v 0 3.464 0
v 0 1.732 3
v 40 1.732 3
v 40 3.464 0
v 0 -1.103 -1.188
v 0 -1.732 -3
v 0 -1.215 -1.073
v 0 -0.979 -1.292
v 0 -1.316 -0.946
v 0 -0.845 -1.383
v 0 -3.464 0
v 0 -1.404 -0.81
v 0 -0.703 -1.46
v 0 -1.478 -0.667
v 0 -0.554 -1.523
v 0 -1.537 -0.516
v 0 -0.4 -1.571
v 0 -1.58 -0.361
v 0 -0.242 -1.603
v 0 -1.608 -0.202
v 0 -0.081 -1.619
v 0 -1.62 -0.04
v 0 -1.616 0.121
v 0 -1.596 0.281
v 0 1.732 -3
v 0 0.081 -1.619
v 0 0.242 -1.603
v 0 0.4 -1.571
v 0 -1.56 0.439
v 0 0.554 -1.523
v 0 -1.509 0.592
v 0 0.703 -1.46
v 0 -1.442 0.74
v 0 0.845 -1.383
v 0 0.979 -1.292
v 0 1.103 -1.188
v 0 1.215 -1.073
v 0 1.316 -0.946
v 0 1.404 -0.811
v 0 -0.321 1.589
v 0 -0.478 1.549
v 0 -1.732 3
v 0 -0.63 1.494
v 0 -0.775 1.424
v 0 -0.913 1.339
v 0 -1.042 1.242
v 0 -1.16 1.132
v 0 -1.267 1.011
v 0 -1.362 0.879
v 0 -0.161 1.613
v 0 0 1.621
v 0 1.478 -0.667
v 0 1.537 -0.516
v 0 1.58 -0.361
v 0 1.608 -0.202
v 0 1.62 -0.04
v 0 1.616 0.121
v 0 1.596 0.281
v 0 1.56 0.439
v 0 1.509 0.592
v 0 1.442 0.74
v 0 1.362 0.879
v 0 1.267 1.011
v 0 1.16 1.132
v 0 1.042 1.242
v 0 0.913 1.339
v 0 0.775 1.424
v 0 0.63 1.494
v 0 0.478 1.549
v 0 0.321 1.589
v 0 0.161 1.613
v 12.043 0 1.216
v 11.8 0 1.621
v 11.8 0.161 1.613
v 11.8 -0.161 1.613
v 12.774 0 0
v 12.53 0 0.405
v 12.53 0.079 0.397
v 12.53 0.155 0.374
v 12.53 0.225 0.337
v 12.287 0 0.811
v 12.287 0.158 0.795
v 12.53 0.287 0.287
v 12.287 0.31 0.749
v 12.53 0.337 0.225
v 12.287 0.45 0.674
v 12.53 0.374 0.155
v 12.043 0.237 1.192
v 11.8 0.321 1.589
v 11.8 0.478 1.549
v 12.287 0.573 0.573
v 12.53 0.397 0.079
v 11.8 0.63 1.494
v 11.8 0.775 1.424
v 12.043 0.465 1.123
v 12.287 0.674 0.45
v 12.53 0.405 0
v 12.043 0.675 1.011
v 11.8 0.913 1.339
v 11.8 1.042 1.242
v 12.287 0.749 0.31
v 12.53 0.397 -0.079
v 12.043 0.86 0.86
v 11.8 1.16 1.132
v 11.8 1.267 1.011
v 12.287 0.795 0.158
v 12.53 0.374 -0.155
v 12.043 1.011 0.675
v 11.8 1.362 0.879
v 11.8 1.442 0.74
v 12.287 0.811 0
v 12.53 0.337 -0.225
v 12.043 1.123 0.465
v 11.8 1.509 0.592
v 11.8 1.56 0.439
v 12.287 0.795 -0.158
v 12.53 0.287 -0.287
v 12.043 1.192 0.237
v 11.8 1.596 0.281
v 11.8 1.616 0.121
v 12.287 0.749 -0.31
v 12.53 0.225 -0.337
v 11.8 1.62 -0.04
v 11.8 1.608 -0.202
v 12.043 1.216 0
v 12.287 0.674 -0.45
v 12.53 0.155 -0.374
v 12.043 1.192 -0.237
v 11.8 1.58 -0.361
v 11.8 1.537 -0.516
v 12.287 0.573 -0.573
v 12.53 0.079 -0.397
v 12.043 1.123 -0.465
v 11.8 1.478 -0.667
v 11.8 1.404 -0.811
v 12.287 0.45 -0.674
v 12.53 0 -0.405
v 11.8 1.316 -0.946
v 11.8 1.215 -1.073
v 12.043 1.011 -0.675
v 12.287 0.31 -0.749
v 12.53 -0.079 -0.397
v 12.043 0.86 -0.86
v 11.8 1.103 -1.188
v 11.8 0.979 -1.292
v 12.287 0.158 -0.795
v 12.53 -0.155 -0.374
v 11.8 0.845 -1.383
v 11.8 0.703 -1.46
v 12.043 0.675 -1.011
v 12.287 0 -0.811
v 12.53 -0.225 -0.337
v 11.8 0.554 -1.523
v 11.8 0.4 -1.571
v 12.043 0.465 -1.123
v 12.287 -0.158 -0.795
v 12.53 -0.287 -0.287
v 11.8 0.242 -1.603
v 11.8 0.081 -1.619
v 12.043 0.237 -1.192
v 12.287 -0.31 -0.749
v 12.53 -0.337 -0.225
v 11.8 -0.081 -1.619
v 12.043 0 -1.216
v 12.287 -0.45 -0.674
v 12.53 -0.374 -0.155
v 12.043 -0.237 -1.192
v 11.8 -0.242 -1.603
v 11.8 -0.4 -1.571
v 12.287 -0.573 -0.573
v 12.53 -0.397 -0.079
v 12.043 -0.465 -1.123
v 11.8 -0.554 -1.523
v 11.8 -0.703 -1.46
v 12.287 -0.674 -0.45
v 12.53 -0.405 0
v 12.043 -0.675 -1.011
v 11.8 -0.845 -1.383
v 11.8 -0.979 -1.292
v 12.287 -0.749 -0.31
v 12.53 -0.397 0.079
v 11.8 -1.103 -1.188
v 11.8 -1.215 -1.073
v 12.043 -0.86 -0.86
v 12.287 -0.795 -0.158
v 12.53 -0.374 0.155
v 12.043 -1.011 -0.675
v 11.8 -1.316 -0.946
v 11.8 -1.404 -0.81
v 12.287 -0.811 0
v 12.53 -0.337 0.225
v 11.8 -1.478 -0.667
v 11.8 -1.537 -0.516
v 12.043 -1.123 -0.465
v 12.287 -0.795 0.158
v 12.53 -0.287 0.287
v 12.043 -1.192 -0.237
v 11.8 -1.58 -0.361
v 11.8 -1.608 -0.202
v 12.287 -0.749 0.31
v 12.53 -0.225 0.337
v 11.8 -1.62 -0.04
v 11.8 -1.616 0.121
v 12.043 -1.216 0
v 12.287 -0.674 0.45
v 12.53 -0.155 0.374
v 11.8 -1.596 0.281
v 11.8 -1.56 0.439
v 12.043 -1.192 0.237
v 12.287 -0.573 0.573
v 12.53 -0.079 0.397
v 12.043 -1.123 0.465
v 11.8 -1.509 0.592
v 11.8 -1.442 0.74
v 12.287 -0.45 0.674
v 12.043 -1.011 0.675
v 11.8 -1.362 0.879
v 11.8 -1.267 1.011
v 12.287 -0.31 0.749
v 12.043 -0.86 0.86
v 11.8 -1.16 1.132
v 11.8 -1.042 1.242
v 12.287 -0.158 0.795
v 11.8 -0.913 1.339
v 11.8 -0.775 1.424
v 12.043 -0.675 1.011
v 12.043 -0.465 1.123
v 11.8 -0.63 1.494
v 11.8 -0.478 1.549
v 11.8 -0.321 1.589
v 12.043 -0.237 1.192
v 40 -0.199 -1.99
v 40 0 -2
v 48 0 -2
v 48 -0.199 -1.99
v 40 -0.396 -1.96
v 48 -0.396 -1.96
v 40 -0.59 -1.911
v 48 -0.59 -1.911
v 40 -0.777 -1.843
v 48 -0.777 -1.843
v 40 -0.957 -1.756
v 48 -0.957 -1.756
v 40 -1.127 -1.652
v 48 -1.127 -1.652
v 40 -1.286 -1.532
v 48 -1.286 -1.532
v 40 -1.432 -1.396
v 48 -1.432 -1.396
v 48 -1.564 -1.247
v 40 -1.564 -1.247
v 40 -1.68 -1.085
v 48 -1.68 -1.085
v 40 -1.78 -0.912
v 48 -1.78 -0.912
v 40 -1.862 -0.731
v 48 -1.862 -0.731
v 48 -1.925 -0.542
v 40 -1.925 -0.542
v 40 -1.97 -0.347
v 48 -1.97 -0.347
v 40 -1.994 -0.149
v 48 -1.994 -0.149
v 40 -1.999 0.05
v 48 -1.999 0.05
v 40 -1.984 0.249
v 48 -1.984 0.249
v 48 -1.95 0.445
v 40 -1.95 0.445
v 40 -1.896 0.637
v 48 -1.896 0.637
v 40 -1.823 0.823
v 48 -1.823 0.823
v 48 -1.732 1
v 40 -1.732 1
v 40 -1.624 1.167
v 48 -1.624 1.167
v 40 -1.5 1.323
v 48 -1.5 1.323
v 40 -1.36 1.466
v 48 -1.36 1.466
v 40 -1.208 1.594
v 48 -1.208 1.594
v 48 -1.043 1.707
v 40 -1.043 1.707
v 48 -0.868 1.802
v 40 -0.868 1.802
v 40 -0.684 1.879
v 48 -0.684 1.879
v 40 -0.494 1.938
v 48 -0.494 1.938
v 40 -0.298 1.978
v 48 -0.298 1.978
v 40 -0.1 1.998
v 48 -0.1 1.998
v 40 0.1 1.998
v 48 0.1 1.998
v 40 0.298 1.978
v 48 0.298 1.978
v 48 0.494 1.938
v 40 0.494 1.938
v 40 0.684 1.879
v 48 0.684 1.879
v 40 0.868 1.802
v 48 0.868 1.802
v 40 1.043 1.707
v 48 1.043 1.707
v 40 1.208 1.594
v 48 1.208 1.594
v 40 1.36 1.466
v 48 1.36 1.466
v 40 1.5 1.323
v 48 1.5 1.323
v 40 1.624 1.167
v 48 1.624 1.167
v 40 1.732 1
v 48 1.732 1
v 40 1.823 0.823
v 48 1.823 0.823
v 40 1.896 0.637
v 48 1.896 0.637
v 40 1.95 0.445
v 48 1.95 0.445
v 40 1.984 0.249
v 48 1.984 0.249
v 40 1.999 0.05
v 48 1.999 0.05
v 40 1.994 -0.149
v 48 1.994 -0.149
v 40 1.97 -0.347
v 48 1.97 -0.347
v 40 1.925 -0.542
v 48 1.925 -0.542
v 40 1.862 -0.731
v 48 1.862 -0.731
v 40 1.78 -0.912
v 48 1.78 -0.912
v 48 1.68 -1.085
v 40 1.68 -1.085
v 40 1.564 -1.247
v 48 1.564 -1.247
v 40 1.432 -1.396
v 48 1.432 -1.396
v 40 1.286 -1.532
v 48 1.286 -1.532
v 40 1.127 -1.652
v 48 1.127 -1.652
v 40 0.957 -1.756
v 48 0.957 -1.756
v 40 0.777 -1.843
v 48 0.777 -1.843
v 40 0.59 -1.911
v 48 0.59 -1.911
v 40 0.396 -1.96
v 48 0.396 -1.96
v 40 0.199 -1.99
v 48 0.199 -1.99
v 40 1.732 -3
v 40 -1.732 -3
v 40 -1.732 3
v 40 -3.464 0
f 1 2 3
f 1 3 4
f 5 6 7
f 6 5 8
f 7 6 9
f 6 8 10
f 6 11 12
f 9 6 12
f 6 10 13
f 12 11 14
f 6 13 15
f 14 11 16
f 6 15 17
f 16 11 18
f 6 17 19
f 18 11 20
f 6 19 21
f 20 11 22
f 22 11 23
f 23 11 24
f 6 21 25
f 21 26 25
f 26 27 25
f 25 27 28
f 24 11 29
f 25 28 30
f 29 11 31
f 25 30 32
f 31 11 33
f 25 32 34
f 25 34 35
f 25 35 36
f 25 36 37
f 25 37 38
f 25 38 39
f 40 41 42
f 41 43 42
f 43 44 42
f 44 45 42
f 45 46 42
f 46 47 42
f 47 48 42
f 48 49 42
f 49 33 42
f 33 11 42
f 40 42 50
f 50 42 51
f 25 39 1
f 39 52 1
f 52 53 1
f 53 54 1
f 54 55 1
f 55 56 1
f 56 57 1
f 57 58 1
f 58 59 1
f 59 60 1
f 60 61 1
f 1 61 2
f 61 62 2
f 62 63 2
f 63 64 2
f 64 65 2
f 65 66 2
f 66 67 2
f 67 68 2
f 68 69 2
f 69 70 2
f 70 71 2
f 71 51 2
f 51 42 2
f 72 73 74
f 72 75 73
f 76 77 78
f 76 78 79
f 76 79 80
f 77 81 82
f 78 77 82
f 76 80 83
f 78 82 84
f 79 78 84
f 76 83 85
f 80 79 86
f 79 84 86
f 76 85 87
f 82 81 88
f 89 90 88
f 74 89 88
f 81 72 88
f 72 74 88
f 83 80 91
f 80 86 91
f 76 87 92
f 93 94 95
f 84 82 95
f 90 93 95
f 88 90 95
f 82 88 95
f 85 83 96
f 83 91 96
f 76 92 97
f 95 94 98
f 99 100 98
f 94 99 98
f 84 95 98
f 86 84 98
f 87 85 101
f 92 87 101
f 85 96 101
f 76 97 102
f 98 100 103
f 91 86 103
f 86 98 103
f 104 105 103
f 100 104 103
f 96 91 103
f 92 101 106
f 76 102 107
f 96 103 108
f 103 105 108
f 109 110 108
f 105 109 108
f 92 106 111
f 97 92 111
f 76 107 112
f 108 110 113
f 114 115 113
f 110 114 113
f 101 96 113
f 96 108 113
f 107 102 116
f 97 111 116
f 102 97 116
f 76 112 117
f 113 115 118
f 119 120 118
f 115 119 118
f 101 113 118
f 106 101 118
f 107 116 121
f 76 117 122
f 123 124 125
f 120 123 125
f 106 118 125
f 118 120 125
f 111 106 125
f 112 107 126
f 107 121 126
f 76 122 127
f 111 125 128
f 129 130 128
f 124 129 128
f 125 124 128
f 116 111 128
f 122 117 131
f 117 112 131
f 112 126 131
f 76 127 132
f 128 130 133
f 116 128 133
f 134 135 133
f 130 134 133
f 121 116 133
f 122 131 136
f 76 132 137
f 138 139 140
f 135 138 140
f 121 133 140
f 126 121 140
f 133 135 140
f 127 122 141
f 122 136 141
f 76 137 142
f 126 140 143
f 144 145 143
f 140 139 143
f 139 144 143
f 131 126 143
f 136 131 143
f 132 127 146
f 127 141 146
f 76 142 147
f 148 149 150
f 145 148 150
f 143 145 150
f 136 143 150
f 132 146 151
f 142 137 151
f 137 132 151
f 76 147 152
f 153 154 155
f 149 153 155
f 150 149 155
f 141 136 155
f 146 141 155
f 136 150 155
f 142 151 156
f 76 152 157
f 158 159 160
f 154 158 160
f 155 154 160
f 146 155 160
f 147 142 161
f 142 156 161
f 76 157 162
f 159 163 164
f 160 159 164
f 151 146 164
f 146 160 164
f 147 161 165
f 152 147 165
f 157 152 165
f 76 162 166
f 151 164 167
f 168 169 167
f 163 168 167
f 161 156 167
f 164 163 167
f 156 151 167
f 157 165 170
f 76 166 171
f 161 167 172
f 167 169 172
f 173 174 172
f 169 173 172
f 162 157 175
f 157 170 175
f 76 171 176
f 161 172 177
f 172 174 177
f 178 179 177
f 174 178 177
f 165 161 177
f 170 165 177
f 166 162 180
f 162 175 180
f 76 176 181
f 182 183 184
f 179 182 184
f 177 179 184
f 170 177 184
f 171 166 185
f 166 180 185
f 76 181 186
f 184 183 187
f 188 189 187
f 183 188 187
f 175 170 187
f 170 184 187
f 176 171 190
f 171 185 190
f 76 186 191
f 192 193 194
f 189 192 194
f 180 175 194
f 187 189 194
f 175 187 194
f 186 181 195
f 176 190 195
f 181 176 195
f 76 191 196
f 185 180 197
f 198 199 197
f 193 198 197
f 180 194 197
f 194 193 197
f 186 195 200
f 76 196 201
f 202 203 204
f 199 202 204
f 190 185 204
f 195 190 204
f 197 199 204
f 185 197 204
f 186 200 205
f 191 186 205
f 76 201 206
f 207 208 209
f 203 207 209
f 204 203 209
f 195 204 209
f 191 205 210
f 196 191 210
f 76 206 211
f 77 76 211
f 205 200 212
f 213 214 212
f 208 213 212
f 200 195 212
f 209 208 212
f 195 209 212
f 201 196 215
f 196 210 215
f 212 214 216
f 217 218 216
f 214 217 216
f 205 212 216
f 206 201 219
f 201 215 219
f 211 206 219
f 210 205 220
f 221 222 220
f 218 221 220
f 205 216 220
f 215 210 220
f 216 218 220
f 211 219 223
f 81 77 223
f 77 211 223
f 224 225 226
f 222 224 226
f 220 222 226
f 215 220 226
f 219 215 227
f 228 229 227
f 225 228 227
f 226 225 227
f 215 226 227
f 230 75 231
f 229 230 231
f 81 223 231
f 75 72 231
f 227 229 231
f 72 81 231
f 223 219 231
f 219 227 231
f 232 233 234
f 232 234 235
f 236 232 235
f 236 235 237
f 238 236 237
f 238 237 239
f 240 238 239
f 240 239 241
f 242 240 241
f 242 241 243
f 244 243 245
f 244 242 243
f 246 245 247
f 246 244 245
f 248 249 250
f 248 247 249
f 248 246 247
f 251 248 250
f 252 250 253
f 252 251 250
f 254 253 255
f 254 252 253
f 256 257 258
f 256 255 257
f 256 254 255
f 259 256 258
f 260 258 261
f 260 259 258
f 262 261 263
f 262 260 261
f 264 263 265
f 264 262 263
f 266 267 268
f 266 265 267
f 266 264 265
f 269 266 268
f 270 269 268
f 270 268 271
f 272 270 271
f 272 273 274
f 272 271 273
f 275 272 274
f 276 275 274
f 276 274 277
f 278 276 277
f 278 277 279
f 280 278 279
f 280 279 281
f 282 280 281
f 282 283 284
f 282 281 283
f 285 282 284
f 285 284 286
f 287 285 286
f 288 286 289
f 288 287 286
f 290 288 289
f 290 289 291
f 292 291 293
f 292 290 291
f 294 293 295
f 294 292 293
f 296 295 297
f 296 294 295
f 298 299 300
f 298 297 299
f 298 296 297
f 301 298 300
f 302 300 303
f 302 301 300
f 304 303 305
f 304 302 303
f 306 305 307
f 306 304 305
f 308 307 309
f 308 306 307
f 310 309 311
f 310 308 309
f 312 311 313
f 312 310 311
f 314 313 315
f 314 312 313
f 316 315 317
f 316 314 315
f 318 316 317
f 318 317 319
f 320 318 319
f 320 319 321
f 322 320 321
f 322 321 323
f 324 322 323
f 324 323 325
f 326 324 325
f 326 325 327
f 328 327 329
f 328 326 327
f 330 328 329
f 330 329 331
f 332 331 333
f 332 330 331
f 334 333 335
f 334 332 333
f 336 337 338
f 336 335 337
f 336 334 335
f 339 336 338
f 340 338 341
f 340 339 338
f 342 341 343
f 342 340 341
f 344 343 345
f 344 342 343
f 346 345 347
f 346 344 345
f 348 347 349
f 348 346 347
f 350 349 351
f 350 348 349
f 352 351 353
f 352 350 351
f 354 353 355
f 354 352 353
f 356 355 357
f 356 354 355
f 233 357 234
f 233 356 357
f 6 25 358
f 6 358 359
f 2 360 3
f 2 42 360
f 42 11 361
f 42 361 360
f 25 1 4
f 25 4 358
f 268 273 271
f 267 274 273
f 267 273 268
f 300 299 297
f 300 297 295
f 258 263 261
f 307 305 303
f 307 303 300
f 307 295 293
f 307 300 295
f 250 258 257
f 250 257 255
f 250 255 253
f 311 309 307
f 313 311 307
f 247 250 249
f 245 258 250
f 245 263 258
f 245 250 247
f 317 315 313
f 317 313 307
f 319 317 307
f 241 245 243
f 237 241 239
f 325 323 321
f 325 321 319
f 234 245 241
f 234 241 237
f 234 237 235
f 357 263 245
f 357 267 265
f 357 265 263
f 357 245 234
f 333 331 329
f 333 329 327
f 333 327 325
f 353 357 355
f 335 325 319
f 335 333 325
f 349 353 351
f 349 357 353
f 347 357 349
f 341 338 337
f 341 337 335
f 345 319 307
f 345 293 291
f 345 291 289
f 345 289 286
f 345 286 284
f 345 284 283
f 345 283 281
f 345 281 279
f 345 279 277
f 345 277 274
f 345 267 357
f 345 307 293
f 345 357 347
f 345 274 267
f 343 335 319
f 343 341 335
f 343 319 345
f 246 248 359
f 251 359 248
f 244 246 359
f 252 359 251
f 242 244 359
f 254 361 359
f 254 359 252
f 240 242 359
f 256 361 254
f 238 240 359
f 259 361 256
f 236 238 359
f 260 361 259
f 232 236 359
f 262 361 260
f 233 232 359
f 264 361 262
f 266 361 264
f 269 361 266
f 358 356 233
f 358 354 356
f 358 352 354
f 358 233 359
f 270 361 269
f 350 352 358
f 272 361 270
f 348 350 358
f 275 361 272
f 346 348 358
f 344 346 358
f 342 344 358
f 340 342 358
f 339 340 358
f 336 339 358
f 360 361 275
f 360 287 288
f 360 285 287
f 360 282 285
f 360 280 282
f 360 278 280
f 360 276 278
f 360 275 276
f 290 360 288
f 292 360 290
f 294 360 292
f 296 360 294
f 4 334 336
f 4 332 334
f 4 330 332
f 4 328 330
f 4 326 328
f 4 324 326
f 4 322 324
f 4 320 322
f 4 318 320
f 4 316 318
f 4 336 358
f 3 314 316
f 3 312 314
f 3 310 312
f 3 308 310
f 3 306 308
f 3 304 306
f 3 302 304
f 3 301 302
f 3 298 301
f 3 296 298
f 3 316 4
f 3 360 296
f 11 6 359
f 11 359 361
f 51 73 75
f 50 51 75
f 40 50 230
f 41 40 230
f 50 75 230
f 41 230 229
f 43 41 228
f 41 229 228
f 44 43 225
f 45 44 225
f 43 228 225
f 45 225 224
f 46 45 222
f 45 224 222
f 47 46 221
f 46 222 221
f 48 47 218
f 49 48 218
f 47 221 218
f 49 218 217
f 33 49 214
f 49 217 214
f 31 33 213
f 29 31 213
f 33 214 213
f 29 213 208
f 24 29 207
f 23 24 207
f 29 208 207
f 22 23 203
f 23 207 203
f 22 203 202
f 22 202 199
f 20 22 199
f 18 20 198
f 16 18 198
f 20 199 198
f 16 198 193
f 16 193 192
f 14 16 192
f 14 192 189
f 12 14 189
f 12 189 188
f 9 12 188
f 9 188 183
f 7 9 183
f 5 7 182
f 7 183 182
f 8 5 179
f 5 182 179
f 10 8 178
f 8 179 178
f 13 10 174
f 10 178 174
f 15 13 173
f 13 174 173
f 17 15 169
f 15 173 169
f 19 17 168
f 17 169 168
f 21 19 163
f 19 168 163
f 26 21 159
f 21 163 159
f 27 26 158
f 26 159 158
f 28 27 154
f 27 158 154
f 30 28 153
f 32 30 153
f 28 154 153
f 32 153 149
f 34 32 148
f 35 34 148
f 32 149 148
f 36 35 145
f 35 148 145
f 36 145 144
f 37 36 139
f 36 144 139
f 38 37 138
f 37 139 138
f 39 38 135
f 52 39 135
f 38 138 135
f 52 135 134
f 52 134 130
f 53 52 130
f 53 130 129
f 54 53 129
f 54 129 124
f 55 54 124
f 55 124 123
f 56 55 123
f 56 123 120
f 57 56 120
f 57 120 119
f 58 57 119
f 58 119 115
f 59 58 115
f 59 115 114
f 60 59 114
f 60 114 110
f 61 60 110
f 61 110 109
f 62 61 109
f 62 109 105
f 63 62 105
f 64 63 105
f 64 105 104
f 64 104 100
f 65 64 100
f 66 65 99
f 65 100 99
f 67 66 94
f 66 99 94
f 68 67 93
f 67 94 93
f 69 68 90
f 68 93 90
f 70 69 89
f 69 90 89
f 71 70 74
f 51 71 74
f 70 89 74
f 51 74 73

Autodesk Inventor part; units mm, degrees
ref_plane "YZ Plane" through (0, 0, 0) normal (1, 0, 0) x (0, 1, 0)
ref_plane "XZ Plane" through (0, 0, 0) normal (0, 1, 0) x (-1, 0, 0)
ref_plane "XY Plane" through (0, 0, 0) normal (0, 0, 1) x (1, 0, 0)
sketch "スケッチ1" plane through (0, 0, 0) normal (1, 0, 0) x (0, 1, 0)
  line L0 (1.7321, -3) -> (-1.7321, -3)
  line L1 (-1.7321, -3) -> (-3.4641, 0)
  line L2 (-3.4641, 0) -> (-1.7321, 3)
  line L3 (-1.7321, 3) -> (1.7321, 3)
  line L4 (1.7321, 3) -> (3.4641, 0)
  line L5 (3.4641, 0) -> (1.7321, -3)
  point P0 (0, 0)
  point P1 (0, 0)
  dimension "d0" = 6
extrude "押し出し1" add sketch "スケッチ1" along normal blind 40
sketch "スケッチ2" plane through (40, 0, 0) normal (1, 0, 0) x (0, 0, -1)
  circle A0 centre (0, 0) radius 2
  dimension "d3" = 4
extrude "押し出し2" add sketch "スケッチ2" along normal blind 8
thread "ねじ1" size "M4x0.7" class "6g" standard "ANSI Metric M Profile" full length
sketch "スケッチ3" plane through (0, 0, 0) normal (-1, 0, 0) x (0, 0, 1)
  point P0 (0, 0)
  point P1 (0, 0)
hole "穴1" at (0, 0, 0) direction (1, 0, 0) diameter 3.242 depth 11.8 tip angle 118 thread size "M4x0.7" class "6H" standard "ISO Metric profile"
properties part number "Spacer_M3_L15" material "鋼、合金"
